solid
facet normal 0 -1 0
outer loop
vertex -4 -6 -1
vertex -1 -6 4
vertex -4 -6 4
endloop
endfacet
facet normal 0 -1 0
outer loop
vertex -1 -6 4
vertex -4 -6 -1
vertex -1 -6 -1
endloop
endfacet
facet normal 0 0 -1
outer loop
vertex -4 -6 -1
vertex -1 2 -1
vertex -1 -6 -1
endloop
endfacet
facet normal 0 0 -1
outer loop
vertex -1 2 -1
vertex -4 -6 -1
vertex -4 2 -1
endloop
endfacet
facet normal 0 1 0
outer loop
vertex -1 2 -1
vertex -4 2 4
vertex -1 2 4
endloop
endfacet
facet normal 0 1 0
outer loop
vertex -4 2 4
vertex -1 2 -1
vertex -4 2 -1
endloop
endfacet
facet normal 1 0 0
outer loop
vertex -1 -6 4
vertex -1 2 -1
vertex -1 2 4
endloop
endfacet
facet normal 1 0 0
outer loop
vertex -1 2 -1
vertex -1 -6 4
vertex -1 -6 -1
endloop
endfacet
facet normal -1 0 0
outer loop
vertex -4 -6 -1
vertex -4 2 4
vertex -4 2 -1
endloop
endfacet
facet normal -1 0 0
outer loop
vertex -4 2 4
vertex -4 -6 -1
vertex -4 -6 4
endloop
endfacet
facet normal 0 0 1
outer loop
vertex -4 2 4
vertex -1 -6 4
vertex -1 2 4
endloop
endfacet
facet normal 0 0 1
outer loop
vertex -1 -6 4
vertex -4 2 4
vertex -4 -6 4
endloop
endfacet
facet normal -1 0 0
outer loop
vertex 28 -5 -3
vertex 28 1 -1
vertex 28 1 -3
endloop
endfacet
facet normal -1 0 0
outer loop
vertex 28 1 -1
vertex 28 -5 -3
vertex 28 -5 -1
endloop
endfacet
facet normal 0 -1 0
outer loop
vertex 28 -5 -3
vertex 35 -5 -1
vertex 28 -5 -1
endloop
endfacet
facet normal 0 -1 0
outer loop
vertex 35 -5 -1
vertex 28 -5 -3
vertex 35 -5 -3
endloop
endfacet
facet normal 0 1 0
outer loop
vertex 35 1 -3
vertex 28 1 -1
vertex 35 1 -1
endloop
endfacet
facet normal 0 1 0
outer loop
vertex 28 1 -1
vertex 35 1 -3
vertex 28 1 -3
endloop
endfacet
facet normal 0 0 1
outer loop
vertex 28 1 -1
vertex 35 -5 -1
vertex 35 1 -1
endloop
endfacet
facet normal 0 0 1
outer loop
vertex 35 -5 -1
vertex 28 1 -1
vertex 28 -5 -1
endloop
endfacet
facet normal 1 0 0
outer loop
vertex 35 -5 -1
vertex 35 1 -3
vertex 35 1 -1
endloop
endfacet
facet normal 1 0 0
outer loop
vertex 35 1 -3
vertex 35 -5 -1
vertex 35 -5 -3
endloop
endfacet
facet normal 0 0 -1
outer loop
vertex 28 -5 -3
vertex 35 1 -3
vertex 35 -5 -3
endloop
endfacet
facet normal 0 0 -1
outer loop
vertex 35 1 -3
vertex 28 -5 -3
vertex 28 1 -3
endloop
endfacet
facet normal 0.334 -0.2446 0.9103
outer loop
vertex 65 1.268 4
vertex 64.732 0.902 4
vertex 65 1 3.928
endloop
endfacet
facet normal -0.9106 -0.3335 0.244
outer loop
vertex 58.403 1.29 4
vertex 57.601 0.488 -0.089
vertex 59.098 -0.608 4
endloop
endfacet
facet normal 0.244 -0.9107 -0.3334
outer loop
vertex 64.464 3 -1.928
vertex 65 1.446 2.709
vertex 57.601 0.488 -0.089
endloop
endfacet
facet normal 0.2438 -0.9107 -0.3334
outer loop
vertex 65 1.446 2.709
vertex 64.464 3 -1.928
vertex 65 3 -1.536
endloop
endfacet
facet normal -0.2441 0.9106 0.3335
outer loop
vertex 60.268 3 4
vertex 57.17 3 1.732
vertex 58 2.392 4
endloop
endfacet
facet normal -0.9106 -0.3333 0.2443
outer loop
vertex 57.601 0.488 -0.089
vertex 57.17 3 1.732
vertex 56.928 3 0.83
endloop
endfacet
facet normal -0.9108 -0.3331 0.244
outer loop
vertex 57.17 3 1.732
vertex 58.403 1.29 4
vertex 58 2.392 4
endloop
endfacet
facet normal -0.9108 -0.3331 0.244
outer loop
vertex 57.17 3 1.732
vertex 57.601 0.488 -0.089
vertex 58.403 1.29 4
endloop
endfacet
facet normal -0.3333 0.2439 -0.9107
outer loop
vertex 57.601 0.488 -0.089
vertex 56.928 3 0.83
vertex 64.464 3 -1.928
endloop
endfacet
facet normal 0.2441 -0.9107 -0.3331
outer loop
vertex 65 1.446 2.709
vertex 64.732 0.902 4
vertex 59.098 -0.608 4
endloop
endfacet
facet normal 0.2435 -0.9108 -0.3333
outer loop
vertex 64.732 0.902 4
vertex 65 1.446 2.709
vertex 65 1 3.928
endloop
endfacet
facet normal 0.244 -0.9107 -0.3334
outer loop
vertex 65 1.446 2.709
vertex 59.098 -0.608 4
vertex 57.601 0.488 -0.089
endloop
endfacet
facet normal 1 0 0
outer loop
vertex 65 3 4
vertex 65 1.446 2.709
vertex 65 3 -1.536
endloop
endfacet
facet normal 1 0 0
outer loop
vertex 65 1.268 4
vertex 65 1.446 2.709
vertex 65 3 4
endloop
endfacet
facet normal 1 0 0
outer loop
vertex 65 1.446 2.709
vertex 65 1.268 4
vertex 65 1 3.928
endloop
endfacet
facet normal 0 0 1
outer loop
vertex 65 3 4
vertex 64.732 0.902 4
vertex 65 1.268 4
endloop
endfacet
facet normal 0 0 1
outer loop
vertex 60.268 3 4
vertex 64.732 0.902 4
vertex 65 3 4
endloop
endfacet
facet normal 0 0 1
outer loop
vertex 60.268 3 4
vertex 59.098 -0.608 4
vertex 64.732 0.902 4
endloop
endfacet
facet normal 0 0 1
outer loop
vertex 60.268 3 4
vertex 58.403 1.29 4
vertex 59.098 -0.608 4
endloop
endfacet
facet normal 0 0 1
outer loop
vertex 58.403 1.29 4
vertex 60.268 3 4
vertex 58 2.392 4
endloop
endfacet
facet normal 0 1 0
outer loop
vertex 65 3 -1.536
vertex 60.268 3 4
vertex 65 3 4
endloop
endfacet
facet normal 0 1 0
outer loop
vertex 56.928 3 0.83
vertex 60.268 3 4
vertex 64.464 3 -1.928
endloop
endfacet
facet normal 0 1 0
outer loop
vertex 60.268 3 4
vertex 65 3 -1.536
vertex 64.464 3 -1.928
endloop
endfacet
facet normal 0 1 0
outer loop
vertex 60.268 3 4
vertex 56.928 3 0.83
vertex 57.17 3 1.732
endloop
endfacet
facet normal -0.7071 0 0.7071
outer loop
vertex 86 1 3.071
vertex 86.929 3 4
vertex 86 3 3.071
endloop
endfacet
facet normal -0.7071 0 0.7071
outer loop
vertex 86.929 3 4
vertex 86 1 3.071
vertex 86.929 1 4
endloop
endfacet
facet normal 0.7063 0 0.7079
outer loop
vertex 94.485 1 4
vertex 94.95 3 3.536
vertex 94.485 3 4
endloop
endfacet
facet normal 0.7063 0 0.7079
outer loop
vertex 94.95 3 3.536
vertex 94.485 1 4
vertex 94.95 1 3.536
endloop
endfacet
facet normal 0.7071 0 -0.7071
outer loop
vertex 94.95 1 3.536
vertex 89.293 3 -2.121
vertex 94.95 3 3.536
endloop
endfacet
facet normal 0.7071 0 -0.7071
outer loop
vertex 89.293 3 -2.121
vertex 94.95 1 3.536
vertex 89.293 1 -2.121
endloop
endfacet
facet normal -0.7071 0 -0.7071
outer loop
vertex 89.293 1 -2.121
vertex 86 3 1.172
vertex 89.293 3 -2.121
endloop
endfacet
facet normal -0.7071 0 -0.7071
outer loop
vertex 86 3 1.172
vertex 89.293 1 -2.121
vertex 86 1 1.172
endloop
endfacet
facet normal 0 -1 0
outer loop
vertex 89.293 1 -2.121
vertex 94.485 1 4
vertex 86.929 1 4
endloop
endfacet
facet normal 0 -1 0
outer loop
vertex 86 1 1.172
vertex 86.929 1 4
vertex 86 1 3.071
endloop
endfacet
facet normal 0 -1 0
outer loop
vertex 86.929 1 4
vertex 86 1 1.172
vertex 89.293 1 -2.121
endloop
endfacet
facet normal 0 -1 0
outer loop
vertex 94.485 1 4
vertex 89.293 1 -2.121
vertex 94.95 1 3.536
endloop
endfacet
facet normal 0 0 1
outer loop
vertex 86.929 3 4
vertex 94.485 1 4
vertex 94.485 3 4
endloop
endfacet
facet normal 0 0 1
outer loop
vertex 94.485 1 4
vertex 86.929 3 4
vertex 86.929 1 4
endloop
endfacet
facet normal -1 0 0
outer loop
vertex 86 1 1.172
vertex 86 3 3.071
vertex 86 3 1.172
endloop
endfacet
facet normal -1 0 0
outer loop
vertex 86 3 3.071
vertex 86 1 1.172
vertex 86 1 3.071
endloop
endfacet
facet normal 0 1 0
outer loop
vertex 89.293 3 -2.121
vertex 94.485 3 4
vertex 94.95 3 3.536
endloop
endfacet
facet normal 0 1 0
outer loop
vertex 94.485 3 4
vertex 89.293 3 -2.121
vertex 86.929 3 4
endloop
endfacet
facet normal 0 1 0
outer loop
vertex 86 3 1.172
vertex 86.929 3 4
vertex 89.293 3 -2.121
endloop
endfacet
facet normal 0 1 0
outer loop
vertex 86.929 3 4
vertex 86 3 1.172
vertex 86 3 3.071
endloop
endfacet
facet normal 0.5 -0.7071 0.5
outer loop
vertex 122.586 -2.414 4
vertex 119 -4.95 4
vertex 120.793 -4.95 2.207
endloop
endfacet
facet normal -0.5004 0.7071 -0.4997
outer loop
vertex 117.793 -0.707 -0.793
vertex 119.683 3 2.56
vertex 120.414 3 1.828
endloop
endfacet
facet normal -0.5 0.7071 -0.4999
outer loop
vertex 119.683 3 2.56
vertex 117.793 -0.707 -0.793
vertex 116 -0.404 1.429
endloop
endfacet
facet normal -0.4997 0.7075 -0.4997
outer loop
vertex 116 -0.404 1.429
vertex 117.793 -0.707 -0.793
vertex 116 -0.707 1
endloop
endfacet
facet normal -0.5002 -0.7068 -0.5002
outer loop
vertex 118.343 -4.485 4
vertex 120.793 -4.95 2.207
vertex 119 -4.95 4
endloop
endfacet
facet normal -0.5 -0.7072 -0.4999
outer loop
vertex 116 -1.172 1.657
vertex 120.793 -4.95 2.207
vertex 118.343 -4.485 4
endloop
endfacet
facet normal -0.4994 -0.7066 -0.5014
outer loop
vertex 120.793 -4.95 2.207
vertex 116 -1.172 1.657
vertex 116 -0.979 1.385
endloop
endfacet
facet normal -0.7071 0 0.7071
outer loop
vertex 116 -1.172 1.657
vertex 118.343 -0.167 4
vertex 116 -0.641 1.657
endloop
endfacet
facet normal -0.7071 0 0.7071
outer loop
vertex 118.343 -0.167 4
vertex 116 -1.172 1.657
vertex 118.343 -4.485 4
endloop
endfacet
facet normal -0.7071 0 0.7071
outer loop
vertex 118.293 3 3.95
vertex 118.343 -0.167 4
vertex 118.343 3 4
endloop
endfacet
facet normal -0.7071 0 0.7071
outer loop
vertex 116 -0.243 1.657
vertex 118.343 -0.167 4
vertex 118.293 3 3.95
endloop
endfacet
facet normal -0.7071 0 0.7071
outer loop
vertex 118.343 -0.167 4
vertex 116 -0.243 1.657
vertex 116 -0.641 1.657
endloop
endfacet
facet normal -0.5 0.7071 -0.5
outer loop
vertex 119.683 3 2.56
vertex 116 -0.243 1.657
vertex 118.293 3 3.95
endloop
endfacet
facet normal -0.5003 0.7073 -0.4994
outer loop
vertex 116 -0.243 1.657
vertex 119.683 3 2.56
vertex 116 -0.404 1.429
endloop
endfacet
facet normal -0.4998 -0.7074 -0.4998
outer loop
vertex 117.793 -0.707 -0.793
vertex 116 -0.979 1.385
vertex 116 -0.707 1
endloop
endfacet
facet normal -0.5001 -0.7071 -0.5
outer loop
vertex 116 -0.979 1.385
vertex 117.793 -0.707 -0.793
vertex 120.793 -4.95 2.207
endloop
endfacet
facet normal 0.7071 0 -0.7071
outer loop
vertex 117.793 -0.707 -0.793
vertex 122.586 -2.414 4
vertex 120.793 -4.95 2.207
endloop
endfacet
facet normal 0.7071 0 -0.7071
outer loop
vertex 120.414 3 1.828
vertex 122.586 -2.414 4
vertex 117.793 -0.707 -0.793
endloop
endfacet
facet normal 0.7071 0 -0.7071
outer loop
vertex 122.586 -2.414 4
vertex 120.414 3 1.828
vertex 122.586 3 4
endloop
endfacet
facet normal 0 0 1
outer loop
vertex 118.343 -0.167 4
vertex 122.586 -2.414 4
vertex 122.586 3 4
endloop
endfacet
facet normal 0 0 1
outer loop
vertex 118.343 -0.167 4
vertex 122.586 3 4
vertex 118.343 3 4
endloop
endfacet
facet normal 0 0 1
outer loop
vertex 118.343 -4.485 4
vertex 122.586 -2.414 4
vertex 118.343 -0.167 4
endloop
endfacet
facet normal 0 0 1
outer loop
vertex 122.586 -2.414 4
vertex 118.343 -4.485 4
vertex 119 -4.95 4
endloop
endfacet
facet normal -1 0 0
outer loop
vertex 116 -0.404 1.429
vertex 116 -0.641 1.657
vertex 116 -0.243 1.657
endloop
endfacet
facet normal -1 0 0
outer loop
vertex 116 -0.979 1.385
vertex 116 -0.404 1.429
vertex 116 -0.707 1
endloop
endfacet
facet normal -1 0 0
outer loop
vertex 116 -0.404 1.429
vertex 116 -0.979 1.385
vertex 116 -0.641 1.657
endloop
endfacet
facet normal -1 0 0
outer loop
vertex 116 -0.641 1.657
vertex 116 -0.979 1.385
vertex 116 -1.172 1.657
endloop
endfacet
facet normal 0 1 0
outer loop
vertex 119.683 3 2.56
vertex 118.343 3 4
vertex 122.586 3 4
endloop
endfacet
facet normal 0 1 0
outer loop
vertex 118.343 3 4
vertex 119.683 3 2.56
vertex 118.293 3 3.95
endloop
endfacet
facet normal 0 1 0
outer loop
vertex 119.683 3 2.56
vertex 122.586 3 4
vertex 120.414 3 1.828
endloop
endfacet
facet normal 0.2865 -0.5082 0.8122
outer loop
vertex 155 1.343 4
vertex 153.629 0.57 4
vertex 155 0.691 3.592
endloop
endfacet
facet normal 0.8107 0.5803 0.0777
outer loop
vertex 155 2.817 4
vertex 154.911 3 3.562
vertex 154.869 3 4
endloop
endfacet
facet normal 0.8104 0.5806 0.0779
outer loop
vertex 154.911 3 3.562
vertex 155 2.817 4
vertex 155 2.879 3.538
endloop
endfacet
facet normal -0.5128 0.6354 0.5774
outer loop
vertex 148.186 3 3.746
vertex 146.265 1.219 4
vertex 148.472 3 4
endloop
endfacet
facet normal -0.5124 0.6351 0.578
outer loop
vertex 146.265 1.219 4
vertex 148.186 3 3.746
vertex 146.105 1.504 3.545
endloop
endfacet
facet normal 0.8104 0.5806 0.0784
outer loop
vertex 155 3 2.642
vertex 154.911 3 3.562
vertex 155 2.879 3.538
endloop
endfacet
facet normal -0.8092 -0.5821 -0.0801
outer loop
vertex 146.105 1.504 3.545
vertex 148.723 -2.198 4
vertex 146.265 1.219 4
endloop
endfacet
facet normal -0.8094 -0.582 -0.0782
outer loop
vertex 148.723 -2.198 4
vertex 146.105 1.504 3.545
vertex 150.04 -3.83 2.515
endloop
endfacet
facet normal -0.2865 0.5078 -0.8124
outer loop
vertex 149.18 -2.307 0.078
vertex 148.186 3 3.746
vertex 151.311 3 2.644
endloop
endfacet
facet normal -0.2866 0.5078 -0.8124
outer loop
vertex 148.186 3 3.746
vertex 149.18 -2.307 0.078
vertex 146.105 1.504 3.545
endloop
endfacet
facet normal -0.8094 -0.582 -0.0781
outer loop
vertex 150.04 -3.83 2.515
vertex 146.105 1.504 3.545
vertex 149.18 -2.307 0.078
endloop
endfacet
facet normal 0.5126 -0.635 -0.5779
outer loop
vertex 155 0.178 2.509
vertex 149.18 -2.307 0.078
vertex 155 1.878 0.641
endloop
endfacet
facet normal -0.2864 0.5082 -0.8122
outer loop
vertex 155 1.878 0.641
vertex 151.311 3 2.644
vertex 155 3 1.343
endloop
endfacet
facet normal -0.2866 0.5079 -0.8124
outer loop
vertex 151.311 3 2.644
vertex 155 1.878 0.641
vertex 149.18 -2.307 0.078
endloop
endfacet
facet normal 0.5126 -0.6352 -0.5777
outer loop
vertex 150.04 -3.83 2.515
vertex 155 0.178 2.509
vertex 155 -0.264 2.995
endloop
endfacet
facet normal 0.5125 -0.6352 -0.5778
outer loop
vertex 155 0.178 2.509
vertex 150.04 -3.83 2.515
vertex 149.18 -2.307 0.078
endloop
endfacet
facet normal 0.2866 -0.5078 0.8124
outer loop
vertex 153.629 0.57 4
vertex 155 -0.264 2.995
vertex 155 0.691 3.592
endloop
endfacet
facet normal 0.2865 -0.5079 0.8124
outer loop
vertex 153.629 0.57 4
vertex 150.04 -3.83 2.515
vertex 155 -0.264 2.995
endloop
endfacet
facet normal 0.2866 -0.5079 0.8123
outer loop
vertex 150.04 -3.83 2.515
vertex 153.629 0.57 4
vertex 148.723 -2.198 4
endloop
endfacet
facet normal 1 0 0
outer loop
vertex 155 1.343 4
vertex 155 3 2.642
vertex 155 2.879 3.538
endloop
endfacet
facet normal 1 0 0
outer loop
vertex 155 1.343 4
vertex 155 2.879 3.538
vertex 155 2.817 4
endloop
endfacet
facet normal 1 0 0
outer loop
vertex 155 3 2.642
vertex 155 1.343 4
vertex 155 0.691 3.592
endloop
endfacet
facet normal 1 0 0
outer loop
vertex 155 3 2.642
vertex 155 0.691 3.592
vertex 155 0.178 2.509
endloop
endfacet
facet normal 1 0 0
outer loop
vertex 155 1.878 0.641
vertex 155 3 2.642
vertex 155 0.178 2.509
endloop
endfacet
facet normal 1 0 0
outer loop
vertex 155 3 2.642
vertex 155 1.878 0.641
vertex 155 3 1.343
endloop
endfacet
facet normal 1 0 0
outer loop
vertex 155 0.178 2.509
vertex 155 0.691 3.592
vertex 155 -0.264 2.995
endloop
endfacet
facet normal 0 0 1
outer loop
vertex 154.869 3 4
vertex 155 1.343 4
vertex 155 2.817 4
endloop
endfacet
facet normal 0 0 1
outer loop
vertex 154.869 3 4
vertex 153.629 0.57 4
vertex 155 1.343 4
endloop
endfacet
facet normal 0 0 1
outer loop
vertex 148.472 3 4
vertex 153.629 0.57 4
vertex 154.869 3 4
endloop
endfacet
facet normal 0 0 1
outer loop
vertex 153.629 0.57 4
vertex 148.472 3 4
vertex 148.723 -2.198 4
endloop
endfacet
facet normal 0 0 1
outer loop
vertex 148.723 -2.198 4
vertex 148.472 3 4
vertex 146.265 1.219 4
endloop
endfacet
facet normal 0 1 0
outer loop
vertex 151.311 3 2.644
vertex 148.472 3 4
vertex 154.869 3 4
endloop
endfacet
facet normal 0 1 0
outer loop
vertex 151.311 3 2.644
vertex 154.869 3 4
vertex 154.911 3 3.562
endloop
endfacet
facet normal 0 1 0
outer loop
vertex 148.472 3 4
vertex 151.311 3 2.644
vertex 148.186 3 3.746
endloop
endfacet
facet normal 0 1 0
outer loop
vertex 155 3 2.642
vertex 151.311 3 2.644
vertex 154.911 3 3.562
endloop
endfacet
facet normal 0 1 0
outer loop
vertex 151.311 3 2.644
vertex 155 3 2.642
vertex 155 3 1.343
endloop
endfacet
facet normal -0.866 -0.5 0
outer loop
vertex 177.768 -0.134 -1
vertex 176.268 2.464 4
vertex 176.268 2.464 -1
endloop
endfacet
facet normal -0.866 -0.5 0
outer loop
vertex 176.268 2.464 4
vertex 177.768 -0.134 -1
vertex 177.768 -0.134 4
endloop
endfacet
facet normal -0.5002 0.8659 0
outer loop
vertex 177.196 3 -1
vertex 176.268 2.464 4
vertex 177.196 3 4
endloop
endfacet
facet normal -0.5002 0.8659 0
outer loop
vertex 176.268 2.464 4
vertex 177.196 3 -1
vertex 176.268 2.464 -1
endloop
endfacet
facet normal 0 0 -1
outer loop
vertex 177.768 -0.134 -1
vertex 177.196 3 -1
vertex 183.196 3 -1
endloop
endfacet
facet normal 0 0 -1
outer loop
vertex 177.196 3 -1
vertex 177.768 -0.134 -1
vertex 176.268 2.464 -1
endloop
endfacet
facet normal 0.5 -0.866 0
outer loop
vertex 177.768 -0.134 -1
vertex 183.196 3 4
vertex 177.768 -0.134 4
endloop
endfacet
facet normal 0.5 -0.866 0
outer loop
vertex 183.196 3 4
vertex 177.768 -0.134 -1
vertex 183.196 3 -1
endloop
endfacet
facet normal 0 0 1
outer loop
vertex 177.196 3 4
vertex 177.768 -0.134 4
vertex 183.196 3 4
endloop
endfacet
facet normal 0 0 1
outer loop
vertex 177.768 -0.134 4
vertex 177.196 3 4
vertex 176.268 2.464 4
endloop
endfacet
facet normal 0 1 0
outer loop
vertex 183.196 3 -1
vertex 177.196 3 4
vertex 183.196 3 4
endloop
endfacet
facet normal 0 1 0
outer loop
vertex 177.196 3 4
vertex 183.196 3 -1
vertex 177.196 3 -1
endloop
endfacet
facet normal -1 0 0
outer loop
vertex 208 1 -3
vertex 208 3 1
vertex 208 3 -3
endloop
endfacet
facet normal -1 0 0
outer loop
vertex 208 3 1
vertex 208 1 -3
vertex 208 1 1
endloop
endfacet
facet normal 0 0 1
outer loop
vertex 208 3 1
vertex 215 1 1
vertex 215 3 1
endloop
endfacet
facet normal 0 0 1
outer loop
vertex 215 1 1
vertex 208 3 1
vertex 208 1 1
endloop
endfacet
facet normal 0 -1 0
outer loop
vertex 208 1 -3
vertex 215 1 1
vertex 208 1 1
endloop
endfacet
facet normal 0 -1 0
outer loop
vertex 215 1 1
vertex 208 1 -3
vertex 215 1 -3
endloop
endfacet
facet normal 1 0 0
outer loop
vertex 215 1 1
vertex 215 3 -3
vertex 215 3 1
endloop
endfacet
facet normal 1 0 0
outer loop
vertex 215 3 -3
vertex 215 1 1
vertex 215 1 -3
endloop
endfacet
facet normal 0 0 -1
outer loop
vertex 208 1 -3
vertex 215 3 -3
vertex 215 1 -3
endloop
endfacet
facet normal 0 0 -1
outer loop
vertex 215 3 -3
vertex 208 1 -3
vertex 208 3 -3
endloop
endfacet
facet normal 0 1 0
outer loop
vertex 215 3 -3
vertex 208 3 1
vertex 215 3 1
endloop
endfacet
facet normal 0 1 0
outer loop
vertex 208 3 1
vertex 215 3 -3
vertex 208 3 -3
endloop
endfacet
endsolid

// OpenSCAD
// mirror about any plane, rotate about any axis: rotating/mirroring keeps the volume, so each result is
// clipped by a box that is lopsided on every axis, and the CLIPPED volume depends on the orientation
module block() translate([-2, 1, -1]) cube([8, 3, 6]);
module clip(at) translate([at, 0, 0]) intersection() { children(); translate([-4, -6, -3]) cube([9, 9, 7]); }
clip(0) mirror([1, 1, 0]) block();
clip(30) mirror([0, 1, 1]) block();
clip(60) rotate(a = 30, v = [1, 1, 1]) block();
clip(90) rotate(45, [0, -1, 0]) block();                  // a negative axis turns the other way
clip(120) rotate(a = 90, v = [1, 0, 1]) block();
n = [0.3, -1, 0.5];
clip(150) mirror(n) rotate(20, n) block();                // runtime vectors
clip(180) rotate(a = [0, 0, 30], v = [1, 0, 0]) block();  // a vector `a` ignores v
clip(210) mirror([0, 0, 1]) block();                      // coordinate planes stay the plain form
